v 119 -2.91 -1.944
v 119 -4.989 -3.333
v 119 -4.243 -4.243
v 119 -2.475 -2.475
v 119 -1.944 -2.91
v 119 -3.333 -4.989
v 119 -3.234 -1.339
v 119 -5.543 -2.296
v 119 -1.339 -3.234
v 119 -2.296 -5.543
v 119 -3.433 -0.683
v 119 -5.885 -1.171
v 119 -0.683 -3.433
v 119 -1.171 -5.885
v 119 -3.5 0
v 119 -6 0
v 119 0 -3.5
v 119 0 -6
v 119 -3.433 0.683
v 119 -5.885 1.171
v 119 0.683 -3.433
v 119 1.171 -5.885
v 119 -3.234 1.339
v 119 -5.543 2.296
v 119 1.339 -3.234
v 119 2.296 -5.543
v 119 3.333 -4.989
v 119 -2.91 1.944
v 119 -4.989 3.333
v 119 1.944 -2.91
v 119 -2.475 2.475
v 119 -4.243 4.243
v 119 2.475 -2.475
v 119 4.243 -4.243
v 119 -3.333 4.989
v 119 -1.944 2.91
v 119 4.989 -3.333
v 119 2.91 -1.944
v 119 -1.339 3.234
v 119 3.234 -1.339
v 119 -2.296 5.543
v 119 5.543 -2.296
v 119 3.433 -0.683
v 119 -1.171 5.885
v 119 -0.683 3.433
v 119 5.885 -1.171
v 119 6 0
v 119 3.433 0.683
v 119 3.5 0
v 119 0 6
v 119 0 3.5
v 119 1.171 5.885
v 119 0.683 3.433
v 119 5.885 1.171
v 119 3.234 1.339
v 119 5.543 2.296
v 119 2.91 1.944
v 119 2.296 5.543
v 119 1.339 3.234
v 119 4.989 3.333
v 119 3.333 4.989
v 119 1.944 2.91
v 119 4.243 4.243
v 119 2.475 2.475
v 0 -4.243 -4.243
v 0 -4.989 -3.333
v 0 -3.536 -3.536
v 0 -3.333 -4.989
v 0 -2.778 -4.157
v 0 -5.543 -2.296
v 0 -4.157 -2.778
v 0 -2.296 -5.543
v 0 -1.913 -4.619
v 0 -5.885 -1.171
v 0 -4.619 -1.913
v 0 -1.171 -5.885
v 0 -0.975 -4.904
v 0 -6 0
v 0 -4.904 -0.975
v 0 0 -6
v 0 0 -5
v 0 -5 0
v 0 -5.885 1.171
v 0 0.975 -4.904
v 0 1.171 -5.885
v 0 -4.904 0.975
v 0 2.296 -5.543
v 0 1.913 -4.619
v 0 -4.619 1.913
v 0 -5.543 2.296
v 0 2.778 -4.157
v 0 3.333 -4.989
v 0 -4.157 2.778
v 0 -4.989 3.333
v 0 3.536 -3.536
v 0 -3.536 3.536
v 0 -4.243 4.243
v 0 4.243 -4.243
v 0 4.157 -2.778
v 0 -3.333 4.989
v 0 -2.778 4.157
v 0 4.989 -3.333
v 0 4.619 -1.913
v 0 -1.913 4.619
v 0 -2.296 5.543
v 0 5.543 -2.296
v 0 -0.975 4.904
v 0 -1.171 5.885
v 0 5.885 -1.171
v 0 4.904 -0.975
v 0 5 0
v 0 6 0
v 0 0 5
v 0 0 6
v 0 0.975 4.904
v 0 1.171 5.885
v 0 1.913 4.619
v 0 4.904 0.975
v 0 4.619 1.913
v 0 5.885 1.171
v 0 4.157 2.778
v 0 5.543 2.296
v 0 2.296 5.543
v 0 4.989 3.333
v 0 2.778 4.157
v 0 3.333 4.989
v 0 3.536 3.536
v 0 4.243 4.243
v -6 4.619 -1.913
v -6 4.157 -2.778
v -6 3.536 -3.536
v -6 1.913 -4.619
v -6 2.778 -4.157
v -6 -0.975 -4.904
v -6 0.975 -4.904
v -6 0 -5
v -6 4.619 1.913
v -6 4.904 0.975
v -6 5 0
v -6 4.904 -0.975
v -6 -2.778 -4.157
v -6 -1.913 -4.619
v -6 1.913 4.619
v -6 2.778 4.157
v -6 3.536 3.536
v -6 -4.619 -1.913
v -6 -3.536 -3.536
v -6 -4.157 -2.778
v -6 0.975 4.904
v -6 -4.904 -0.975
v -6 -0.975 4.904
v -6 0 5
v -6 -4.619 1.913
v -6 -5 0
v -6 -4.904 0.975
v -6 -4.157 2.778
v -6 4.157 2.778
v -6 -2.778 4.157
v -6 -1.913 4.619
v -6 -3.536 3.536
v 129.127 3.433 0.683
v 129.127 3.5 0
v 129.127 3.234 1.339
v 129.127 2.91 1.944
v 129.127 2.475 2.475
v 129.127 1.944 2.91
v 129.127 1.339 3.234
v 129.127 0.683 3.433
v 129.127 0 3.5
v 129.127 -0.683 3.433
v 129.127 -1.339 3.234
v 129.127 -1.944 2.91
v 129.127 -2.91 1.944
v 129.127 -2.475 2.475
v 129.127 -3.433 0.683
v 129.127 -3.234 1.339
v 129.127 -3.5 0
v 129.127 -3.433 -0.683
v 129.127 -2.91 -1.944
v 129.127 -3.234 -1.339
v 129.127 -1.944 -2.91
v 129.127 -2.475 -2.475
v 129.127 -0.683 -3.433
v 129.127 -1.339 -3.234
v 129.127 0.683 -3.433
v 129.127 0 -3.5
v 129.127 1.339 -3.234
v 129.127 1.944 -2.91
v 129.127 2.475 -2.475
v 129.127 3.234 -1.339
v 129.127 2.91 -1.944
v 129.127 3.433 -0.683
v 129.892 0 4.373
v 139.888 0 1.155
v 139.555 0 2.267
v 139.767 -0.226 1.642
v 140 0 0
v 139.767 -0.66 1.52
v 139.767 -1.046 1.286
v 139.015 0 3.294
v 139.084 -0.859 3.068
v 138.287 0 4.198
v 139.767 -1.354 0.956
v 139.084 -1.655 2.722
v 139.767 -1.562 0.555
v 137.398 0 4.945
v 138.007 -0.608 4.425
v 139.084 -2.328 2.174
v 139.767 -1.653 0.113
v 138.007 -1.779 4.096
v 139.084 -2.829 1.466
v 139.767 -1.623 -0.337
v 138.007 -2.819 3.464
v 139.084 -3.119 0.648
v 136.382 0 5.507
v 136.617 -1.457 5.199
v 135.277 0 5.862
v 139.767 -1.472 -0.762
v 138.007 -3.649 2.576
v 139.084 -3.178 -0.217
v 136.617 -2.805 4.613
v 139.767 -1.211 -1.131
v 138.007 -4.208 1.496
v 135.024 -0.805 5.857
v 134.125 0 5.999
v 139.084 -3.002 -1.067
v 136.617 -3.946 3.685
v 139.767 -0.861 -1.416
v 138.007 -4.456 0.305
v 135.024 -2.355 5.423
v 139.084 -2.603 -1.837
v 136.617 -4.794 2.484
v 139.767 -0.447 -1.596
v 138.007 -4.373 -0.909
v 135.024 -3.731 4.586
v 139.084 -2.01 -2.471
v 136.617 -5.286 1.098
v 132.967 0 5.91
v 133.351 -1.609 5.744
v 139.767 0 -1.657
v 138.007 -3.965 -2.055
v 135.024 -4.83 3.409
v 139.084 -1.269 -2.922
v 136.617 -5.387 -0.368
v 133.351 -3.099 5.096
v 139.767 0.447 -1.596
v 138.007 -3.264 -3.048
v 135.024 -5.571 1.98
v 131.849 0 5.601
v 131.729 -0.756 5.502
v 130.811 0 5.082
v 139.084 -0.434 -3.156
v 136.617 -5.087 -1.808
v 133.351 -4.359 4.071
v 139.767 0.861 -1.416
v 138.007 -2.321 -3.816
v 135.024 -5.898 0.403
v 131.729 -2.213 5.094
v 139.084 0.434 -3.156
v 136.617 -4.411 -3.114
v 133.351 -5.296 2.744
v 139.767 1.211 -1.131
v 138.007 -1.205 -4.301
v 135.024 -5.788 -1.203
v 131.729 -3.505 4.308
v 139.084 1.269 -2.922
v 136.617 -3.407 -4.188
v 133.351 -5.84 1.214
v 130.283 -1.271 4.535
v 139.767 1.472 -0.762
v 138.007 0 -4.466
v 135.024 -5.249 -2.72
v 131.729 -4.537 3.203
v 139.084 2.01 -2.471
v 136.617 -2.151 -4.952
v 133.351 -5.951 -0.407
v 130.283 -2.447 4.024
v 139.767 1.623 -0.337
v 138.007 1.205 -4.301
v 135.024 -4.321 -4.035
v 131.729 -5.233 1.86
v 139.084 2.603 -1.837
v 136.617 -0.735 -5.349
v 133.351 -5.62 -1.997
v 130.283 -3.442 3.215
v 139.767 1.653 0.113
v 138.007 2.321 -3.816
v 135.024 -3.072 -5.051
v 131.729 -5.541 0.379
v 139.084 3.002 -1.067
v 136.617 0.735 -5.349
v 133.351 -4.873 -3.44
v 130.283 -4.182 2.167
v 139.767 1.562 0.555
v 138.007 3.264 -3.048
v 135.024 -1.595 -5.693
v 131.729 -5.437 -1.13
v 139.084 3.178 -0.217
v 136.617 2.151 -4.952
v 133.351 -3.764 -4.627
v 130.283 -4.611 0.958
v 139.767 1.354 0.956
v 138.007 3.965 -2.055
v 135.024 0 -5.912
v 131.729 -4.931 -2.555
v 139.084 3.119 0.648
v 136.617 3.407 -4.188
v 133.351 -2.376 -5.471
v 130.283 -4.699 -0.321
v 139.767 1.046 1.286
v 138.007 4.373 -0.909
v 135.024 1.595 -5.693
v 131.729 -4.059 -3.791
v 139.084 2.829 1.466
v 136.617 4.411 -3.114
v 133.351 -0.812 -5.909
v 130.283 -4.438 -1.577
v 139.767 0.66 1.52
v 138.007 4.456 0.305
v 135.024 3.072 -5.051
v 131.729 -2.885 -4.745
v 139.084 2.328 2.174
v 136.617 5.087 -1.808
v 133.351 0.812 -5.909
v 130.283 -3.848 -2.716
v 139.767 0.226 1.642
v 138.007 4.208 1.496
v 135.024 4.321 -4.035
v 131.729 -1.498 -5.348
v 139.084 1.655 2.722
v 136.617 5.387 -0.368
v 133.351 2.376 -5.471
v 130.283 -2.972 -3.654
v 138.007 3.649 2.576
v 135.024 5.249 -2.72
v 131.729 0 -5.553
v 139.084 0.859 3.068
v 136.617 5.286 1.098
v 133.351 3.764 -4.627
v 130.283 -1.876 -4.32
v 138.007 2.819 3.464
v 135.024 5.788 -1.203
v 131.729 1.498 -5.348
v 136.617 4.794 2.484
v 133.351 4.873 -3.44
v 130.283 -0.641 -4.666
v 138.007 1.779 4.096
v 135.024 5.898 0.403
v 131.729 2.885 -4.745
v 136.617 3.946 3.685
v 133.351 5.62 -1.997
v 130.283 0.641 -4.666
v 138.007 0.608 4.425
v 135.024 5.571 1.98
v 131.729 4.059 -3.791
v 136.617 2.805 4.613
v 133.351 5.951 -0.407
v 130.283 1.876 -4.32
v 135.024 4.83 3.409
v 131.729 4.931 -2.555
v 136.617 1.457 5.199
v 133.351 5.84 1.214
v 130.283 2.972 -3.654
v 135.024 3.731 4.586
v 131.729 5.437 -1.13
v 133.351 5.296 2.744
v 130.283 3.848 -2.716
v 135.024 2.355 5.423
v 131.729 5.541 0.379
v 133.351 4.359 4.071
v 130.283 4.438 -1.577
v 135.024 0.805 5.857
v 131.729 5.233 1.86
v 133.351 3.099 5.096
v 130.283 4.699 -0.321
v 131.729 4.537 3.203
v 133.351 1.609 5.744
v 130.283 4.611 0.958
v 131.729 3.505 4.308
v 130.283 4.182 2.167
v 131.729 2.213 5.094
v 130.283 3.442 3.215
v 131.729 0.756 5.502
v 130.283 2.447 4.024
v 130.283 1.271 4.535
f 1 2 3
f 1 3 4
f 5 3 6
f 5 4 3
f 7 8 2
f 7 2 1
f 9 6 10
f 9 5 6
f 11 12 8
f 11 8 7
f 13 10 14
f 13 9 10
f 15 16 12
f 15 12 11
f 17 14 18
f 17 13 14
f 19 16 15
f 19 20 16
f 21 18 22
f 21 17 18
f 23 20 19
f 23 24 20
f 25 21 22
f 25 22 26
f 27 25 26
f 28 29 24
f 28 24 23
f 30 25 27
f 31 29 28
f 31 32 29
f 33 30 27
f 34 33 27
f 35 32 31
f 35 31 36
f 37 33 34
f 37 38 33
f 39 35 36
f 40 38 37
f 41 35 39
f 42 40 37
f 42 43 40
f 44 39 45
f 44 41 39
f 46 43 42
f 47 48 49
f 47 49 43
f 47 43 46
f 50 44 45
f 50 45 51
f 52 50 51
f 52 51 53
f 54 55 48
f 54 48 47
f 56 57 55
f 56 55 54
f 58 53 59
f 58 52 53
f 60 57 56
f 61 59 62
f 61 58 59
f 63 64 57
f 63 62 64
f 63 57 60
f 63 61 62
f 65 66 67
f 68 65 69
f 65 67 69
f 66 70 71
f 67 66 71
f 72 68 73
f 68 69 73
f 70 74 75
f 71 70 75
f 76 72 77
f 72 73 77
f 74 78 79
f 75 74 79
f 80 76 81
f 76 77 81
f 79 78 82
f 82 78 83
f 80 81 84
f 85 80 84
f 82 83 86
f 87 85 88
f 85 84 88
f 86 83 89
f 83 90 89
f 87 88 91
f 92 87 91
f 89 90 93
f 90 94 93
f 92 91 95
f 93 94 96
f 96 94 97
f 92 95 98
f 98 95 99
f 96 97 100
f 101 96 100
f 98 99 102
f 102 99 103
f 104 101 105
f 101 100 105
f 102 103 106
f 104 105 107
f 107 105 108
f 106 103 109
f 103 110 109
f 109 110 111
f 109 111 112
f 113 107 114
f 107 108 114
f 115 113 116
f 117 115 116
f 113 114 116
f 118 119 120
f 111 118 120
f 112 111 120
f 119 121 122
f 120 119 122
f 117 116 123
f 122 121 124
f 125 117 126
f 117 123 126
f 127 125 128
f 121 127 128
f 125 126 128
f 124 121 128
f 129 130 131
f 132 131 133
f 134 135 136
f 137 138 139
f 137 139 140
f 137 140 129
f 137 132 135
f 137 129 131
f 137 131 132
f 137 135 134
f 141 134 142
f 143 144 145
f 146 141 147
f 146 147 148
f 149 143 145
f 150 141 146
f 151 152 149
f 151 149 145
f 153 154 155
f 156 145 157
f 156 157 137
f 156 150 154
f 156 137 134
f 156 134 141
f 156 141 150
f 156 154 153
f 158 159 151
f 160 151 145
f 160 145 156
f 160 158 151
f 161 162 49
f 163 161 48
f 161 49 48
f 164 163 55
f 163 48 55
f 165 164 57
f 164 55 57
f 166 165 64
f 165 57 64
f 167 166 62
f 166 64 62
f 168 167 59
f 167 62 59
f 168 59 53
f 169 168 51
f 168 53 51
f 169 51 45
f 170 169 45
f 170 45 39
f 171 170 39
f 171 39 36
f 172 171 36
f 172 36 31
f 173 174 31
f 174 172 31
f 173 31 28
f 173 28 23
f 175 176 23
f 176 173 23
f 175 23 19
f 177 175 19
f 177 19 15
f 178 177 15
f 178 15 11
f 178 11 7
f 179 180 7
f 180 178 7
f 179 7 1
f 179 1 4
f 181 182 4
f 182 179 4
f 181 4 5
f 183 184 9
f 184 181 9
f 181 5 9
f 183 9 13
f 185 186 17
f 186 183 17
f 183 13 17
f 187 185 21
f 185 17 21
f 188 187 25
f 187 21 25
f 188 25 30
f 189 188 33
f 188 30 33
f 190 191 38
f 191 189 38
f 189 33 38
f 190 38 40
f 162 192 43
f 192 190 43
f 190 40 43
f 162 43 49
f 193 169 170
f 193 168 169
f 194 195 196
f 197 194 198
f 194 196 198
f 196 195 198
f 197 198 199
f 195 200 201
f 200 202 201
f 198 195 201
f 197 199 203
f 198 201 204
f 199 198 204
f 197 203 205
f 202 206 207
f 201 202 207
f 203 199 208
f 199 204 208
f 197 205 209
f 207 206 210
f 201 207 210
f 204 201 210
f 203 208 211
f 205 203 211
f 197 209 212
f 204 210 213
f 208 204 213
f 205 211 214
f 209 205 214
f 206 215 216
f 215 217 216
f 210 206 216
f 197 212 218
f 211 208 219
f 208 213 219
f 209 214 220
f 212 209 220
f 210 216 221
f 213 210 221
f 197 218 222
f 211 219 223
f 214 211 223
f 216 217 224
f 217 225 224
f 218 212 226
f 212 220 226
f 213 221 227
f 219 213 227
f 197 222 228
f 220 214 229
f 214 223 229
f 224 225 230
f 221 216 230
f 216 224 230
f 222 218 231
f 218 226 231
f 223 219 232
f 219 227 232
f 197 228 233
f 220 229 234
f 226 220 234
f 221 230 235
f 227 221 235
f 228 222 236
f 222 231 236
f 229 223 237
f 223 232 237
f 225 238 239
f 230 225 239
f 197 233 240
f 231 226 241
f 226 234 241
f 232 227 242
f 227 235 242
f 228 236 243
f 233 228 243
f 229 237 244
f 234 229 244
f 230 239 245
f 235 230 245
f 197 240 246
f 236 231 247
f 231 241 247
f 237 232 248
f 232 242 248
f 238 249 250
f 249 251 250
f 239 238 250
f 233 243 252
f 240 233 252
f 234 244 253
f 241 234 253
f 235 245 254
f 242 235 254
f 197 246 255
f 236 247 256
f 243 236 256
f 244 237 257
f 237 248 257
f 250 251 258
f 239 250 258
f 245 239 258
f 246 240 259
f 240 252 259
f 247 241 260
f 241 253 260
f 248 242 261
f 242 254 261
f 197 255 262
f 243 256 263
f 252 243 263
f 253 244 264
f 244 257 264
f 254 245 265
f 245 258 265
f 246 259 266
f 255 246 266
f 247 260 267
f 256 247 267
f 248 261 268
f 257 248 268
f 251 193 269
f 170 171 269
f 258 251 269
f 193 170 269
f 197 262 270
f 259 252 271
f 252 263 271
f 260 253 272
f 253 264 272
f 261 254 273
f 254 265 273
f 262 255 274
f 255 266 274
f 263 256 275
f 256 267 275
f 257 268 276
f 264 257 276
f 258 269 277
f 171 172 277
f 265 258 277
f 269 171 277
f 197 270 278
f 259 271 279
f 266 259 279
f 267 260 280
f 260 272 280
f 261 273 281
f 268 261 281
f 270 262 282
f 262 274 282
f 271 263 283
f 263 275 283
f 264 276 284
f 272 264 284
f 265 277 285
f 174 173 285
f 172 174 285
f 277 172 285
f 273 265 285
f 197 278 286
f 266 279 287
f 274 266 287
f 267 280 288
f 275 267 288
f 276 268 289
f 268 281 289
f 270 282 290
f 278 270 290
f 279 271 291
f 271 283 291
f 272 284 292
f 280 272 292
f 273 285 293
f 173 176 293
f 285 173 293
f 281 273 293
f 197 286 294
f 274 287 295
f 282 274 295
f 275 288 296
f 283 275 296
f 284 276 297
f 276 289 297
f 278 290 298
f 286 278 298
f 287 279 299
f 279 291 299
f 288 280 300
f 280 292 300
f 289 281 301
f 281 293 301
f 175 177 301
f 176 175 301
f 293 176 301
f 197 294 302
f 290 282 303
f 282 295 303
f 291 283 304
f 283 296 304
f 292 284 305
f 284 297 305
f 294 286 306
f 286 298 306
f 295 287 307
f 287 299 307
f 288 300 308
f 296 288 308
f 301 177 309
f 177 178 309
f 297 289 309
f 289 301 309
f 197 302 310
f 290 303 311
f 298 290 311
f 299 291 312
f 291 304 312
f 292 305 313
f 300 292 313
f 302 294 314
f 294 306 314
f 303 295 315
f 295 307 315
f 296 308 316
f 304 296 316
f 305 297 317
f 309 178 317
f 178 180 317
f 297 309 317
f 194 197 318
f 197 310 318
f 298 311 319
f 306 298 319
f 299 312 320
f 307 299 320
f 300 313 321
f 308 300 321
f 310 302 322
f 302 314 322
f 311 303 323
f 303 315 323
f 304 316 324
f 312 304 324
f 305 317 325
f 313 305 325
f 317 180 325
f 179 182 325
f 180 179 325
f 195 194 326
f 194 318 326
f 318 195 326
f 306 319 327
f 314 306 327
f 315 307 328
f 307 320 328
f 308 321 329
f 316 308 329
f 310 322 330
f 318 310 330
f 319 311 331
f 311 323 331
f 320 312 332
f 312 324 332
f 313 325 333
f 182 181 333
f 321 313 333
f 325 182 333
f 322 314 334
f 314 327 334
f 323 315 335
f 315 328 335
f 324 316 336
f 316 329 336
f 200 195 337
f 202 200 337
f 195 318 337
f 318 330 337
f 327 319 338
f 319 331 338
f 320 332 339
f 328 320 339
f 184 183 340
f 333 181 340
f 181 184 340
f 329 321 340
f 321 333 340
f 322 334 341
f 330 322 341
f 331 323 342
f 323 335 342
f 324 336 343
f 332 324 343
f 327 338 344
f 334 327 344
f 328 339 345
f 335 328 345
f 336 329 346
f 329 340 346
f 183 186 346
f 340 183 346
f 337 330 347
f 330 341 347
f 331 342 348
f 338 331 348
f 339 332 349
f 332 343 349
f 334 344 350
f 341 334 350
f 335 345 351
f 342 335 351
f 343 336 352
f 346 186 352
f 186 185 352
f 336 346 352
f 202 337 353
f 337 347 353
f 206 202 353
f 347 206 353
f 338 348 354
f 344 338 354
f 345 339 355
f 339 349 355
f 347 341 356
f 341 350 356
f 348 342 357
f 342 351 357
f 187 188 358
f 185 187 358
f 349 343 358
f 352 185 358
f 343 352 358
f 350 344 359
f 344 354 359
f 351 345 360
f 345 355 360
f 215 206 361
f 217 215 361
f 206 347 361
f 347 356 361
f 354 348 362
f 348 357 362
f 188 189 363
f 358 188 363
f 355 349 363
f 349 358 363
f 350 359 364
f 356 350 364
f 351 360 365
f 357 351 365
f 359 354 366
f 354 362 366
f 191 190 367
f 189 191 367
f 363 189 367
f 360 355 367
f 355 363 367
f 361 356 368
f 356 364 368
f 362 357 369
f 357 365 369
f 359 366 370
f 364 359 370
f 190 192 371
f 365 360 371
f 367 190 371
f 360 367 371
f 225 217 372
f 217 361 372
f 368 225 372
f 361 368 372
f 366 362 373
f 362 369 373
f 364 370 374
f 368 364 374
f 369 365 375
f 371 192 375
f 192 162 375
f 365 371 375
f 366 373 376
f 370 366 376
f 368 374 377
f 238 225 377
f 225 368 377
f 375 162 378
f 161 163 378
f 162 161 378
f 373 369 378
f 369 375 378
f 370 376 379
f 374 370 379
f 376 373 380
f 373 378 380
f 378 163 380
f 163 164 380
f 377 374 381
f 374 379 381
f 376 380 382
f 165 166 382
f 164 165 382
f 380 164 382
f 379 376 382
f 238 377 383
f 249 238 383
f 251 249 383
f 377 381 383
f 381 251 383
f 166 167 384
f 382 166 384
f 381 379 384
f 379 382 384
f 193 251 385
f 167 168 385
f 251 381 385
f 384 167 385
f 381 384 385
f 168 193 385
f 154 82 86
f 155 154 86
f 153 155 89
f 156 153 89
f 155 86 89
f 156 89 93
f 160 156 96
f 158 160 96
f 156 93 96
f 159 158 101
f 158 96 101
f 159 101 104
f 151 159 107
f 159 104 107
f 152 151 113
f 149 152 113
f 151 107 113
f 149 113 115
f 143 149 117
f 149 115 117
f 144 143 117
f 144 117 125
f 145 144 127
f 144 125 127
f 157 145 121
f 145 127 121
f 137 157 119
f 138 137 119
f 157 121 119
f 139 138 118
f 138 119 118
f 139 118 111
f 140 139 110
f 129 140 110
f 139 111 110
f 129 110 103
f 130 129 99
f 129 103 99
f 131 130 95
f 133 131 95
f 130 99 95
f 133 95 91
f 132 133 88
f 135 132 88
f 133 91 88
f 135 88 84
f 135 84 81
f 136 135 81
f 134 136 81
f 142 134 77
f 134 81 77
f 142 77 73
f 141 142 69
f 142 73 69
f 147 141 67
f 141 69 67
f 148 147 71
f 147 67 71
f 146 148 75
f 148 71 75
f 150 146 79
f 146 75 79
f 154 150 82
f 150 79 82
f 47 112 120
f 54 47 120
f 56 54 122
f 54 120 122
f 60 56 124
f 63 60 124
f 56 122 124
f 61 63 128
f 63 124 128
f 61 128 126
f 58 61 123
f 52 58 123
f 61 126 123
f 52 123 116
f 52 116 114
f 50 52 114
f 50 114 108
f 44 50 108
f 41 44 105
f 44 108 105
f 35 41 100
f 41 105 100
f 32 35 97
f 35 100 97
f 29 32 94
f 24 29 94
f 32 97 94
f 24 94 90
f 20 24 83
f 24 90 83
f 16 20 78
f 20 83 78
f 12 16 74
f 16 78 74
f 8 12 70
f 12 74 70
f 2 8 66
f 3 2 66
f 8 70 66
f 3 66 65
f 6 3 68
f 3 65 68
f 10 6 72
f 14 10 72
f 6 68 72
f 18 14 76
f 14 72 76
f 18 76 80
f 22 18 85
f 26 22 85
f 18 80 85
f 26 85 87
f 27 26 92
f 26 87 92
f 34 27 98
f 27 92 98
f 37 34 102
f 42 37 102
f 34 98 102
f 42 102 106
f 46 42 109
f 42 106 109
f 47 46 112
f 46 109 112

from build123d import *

# Parameters (mm, degrees)
F0_R     = 6
F1_DEPTH = 119
F2_R     = 5
F3_DEPTH = 6
F4_R     = 3.5
F5_DEPTH = 10.13


with BuildPart() as f1:
    # F0 (on Right) → F1 (new body)
    with BuildSketch(Plane.YZ):
        Circle(F0_R)
    extrude(amount=F1_DEPTH)

    # F2 (on face) → F3 (join)
    with BuildSketch(Plane(origin=(0, 0, 0), x_dir=(0, -1, 0), z_dir=(-1, 0, 0))):
        Circle(F2_R)
    extrude(amount=F3_DEPTH)

    # F4 (on face) → F5 (join)
    with BuildSketch(Plane.YZ.offset(119)):
        Circle(F4_R)
    extrude(amount=F5_DEPTH)

    # F6 (on Front) → F7 (revolve)
    with BuildSketch(Plane.XZ):
        with BuildLine():
            Line((128, 0), (140, 0))
            ThreePointArc((140, 0), (134, 6), (128, 0))
        make_face()
    revolve(axis=Axis((134, 0, 0), (1, 0, 0)))


solid = f1.part
